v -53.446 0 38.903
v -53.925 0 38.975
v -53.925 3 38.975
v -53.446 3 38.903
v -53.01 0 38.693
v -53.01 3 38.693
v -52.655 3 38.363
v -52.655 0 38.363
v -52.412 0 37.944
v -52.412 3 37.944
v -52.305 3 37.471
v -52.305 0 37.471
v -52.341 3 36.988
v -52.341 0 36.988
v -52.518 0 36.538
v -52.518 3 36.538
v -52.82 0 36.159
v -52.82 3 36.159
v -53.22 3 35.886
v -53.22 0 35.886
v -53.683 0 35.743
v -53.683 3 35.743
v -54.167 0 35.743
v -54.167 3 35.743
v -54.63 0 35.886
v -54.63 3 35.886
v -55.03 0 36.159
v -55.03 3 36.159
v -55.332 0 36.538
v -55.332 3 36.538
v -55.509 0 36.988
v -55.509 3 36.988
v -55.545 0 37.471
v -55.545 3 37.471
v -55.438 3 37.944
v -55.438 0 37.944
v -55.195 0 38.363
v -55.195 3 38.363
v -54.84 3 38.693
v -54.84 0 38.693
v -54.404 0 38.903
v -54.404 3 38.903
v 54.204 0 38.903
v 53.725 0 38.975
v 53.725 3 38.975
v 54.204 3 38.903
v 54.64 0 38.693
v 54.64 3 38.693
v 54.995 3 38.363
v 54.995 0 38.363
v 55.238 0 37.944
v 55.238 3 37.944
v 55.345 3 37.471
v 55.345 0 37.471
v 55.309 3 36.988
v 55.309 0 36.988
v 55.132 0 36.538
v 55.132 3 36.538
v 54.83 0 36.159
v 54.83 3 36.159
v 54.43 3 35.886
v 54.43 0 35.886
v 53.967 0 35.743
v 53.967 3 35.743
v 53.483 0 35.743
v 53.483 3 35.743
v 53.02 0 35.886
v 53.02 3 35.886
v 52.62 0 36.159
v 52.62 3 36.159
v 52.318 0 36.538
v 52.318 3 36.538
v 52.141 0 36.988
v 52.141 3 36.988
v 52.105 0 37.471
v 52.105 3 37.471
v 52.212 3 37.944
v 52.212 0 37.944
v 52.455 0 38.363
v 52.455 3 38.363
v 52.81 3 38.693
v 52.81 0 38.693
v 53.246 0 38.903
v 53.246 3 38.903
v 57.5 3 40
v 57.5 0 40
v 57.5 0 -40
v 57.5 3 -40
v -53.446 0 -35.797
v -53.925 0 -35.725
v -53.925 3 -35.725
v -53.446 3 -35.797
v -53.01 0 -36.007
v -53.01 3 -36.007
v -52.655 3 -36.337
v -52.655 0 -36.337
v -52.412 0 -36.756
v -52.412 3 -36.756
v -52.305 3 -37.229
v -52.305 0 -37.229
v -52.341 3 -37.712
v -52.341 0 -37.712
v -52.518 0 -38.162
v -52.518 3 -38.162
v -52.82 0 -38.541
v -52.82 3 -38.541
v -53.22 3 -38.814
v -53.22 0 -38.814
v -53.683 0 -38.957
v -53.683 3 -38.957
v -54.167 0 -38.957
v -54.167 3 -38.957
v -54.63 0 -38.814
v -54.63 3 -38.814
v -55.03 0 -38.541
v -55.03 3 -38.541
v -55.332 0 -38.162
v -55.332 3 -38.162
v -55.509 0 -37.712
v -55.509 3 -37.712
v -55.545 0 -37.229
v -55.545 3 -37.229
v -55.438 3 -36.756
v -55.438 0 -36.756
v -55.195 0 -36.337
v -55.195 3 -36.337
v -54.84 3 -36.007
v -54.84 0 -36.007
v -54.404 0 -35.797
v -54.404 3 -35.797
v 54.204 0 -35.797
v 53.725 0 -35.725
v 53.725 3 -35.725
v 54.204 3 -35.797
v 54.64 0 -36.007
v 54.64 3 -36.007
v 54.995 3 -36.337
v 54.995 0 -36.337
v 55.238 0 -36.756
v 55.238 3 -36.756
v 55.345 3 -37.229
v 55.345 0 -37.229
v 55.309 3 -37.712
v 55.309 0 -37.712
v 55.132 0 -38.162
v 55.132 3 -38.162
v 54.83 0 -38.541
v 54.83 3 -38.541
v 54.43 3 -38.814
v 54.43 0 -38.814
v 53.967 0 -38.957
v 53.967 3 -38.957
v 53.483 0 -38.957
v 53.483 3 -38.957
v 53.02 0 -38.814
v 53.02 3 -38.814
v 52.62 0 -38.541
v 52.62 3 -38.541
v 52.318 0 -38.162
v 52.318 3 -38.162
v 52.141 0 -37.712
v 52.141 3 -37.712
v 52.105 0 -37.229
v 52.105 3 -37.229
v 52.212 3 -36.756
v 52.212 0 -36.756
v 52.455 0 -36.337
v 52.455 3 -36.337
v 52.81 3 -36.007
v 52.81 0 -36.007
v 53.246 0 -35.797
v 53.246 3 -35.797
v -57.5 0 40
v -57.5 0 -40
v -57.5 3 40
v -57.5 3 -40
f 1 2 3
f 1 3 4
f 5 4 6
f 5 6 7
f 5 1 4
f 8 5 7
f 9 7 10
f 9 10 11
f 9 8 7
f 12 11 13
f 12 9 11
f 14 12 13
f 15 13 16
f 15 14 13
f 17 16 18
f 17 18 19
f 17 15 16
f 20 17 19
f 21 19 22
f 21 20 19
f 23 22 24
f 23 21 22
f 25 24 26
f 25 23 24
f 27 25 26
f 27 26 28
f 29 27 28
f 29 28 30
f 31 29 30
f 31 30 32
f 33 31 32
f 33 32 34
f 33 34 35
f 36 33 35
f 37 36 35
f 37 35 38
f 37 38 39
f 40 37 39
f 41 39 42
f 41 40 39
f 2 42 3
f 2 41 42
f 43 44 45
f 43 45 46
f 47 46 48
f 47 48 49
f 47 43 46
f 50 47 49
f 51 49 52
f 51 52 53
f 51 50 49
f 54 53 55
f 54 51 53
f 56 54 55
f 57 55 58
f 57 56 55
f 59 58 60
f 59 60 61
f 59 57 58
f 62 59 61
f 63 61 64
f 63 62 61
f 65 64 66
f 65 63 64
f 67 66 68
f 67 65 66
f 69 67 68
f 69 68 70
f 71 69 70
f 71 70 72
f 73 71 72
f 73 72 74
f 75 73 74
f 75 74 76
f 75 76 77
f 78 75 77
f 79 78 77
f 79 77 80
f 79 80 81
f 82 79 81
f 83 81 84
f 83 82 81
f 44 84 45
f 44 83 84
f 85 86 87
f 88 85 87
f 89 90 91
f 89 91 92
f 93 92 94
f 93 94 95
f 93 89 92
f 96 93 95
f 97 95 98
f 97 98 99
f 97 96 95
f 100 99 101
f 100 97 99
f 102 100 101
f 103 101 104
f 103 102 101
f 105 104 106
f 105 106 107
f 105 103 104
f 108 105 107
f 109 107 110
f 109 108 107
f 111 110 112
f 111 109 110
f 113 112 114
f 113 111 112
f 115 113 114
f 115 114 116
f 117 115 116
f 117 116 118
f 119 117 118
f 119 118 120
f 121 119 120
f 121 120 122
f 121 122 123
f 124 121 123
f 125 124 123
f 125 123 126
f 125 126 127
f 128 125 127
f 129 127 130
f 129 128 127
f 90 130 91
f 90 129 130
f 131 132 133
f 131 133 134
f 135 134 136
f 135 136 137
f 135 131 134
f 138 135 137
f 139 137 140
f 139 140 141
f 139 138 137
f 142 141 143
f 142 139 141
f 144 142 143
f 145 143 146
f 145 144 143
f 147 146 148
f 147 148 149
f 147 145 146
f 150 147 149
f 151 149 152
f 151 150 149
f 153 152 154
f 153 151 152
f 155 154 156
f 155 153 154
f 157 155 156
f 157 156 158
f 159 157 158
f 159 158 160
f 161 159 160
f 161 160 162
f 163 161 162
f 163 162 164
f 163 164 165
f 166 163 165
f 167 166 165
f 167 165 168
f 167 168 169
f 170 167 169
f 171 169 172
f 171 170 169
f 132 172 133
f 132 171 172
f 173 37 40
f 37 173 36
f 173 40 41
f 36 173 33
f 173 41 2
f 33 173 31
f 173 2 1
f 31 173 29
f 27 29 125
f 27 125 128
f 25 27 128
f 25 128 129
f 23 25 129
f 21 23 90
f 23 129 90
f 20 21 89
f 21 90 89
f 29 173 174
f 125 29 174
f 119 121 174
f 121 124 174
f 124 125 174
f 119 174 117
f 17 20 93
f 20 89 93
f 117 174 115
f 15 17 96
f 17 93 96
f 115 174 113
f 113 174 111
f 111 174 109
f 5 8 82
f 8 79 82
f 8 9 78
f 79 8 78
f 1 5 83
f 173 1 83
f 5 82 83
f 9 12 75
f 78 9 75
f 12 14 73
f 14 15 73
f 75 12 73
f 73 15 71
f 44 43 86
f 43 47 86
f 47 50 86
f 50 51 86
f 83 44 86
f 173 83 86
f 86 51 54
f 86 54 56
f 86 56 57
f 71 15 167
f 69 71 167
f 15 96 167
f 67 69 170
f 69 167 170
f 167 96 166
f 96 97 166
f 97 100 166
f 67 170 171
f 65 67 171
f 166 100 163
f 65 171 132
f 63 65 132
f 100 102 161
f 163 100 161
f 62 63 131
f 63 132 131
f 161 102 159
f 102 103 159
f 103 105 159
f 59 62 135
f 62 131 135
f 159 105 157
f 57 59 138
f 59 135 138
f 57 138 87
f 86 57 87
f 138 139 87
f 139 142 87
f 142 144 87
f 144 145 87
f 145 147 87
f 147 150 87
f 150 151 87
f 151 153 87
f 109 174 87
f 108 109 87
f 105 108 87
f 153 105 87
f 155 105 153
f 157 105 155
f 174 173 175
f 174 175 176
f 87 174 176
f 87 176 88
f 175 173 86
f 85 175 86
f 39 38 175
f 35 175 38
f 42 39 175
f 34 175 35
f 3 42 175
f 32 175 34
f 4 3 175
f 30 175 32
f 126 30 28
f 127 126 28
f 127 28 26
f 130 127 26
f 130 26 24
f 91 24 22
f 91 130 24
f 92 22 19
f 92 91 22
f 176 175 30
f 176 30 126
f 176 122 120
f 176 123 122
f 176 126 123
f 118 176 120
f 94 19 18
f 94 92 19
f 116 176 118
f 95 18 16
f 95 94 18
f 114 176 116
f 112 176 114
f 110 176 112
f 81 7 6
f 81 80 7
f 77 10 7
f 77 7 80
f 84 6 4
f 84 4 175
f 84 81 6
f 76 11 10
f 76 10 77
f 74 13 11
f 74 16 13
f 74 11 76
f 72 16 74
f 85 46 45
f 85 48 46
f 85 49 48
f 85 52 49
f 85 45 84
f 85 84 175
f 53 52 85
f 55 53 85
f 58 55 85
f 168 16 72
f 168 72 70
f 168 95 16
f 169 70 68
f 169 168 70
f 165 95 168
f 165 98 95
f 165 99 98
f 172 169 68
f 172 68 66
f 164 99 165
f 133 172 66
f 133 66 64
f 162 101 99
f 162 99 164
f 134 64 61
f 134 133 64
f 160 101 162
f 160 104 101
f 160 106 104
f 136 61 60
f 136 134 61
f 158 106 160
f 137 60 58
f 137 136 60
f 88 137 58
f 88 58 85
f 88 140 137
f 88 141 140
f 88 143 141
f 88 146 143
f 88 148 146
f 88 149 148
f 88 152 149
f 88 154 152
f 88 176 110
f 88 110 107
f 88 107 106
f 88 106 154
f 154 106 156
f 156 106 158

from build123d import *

# Parameters (mm, degrees)
SKETCH_1_W             = 115
SKETCH_1_H             = 80
EXTRUDE_1_DEPTH        = 3
SKETCH_1_4_OUTSIDE_W   = 145.024
SKETCH_1_4_OUTSIDE_H   = 110.024
SKETCH_1_4_OUTSIDE_W_2 = 115
SKETCH_1_4_OUTSIDE_H_2 = 80
SKETCH_1_4_OUTSIDE_R   = 1.625
CUT_EXTRUDE_3_DEPTH    = 3


with BuildPart() as part:
    # 草图1 → 凸台-拉伸1 (new body)
    with BuildSketch(Plane(origin=(0, 0, 0), x_dir=(1, 0, 0), z_dir=(0, 1, 0))):
        Rectangle(SKETCH_1_W, SKETCH_1_H)
    extrude(amount=EXTRUDE_1_DEPTH)

    # 草图1<4> outside → 切除-拉伸3 (cut)
    # profile 1 of 5: a face of its own
    with BuildSketch(Plane(origin=(0, 0, 0), x_dir=(1, 0, 0), z_dir=(0, 1, 0))):
        Rectangle(SKETCH_1_4_OUTSIDE_W, SKETCH_1_4_OUTSIDE_H)
        Rectangle(SKETCH_1_4_OUTSIDE_W_2, SKETCH_1_4_OUTSIDE_H_2, mode=Mode.SUBTRACT)
    # profile 2 of 5: a face of its own
    with BuildSketch(Plane(origin=(0, 0, 0), x_dir=(1, 0, 0), z_dir=(0, 1, 0))):
        with Locations((-53.925, 37.35)):
            Circle(SKETCH_1_4_OUTSIDE_R)
    # profile 3 of 5: a face of its own
    with BuildSketch(Plane(origin=(0, 0, 0), x_dir=(1, 0, 0), z_dir=(0, 1, 0))):
        with Locations((53.725, 37.35)):
            Circle(SKETCH_1_4_OUTSIDE_R)
    # profile 4 of 5: a face of its own
    with BuildSketch(Plane(origin=(0, 0, 0), x_dir=(1, 0, 0), z_dir=(0, 1, 0))):
        with Locations((-53.925, -37.35)):
            Circle(SKETCH_1_4_OUTSIDE_R)
    # profile 5 of 5: a face of its own
    with BuildSketch(Plane(origin=(0, 0, 0), x_dir=(1, 0, 0), z_dir=(0, 1, 0))):
        with Locations((53.725, -37.35)):
            Circle(SKETCH_1_4_OUTSIDE_R)
    extrude(amount=CUT_EXTRUDE_3_DEPTH, mode=Mode.SUBTRACT)


solid = part.part
